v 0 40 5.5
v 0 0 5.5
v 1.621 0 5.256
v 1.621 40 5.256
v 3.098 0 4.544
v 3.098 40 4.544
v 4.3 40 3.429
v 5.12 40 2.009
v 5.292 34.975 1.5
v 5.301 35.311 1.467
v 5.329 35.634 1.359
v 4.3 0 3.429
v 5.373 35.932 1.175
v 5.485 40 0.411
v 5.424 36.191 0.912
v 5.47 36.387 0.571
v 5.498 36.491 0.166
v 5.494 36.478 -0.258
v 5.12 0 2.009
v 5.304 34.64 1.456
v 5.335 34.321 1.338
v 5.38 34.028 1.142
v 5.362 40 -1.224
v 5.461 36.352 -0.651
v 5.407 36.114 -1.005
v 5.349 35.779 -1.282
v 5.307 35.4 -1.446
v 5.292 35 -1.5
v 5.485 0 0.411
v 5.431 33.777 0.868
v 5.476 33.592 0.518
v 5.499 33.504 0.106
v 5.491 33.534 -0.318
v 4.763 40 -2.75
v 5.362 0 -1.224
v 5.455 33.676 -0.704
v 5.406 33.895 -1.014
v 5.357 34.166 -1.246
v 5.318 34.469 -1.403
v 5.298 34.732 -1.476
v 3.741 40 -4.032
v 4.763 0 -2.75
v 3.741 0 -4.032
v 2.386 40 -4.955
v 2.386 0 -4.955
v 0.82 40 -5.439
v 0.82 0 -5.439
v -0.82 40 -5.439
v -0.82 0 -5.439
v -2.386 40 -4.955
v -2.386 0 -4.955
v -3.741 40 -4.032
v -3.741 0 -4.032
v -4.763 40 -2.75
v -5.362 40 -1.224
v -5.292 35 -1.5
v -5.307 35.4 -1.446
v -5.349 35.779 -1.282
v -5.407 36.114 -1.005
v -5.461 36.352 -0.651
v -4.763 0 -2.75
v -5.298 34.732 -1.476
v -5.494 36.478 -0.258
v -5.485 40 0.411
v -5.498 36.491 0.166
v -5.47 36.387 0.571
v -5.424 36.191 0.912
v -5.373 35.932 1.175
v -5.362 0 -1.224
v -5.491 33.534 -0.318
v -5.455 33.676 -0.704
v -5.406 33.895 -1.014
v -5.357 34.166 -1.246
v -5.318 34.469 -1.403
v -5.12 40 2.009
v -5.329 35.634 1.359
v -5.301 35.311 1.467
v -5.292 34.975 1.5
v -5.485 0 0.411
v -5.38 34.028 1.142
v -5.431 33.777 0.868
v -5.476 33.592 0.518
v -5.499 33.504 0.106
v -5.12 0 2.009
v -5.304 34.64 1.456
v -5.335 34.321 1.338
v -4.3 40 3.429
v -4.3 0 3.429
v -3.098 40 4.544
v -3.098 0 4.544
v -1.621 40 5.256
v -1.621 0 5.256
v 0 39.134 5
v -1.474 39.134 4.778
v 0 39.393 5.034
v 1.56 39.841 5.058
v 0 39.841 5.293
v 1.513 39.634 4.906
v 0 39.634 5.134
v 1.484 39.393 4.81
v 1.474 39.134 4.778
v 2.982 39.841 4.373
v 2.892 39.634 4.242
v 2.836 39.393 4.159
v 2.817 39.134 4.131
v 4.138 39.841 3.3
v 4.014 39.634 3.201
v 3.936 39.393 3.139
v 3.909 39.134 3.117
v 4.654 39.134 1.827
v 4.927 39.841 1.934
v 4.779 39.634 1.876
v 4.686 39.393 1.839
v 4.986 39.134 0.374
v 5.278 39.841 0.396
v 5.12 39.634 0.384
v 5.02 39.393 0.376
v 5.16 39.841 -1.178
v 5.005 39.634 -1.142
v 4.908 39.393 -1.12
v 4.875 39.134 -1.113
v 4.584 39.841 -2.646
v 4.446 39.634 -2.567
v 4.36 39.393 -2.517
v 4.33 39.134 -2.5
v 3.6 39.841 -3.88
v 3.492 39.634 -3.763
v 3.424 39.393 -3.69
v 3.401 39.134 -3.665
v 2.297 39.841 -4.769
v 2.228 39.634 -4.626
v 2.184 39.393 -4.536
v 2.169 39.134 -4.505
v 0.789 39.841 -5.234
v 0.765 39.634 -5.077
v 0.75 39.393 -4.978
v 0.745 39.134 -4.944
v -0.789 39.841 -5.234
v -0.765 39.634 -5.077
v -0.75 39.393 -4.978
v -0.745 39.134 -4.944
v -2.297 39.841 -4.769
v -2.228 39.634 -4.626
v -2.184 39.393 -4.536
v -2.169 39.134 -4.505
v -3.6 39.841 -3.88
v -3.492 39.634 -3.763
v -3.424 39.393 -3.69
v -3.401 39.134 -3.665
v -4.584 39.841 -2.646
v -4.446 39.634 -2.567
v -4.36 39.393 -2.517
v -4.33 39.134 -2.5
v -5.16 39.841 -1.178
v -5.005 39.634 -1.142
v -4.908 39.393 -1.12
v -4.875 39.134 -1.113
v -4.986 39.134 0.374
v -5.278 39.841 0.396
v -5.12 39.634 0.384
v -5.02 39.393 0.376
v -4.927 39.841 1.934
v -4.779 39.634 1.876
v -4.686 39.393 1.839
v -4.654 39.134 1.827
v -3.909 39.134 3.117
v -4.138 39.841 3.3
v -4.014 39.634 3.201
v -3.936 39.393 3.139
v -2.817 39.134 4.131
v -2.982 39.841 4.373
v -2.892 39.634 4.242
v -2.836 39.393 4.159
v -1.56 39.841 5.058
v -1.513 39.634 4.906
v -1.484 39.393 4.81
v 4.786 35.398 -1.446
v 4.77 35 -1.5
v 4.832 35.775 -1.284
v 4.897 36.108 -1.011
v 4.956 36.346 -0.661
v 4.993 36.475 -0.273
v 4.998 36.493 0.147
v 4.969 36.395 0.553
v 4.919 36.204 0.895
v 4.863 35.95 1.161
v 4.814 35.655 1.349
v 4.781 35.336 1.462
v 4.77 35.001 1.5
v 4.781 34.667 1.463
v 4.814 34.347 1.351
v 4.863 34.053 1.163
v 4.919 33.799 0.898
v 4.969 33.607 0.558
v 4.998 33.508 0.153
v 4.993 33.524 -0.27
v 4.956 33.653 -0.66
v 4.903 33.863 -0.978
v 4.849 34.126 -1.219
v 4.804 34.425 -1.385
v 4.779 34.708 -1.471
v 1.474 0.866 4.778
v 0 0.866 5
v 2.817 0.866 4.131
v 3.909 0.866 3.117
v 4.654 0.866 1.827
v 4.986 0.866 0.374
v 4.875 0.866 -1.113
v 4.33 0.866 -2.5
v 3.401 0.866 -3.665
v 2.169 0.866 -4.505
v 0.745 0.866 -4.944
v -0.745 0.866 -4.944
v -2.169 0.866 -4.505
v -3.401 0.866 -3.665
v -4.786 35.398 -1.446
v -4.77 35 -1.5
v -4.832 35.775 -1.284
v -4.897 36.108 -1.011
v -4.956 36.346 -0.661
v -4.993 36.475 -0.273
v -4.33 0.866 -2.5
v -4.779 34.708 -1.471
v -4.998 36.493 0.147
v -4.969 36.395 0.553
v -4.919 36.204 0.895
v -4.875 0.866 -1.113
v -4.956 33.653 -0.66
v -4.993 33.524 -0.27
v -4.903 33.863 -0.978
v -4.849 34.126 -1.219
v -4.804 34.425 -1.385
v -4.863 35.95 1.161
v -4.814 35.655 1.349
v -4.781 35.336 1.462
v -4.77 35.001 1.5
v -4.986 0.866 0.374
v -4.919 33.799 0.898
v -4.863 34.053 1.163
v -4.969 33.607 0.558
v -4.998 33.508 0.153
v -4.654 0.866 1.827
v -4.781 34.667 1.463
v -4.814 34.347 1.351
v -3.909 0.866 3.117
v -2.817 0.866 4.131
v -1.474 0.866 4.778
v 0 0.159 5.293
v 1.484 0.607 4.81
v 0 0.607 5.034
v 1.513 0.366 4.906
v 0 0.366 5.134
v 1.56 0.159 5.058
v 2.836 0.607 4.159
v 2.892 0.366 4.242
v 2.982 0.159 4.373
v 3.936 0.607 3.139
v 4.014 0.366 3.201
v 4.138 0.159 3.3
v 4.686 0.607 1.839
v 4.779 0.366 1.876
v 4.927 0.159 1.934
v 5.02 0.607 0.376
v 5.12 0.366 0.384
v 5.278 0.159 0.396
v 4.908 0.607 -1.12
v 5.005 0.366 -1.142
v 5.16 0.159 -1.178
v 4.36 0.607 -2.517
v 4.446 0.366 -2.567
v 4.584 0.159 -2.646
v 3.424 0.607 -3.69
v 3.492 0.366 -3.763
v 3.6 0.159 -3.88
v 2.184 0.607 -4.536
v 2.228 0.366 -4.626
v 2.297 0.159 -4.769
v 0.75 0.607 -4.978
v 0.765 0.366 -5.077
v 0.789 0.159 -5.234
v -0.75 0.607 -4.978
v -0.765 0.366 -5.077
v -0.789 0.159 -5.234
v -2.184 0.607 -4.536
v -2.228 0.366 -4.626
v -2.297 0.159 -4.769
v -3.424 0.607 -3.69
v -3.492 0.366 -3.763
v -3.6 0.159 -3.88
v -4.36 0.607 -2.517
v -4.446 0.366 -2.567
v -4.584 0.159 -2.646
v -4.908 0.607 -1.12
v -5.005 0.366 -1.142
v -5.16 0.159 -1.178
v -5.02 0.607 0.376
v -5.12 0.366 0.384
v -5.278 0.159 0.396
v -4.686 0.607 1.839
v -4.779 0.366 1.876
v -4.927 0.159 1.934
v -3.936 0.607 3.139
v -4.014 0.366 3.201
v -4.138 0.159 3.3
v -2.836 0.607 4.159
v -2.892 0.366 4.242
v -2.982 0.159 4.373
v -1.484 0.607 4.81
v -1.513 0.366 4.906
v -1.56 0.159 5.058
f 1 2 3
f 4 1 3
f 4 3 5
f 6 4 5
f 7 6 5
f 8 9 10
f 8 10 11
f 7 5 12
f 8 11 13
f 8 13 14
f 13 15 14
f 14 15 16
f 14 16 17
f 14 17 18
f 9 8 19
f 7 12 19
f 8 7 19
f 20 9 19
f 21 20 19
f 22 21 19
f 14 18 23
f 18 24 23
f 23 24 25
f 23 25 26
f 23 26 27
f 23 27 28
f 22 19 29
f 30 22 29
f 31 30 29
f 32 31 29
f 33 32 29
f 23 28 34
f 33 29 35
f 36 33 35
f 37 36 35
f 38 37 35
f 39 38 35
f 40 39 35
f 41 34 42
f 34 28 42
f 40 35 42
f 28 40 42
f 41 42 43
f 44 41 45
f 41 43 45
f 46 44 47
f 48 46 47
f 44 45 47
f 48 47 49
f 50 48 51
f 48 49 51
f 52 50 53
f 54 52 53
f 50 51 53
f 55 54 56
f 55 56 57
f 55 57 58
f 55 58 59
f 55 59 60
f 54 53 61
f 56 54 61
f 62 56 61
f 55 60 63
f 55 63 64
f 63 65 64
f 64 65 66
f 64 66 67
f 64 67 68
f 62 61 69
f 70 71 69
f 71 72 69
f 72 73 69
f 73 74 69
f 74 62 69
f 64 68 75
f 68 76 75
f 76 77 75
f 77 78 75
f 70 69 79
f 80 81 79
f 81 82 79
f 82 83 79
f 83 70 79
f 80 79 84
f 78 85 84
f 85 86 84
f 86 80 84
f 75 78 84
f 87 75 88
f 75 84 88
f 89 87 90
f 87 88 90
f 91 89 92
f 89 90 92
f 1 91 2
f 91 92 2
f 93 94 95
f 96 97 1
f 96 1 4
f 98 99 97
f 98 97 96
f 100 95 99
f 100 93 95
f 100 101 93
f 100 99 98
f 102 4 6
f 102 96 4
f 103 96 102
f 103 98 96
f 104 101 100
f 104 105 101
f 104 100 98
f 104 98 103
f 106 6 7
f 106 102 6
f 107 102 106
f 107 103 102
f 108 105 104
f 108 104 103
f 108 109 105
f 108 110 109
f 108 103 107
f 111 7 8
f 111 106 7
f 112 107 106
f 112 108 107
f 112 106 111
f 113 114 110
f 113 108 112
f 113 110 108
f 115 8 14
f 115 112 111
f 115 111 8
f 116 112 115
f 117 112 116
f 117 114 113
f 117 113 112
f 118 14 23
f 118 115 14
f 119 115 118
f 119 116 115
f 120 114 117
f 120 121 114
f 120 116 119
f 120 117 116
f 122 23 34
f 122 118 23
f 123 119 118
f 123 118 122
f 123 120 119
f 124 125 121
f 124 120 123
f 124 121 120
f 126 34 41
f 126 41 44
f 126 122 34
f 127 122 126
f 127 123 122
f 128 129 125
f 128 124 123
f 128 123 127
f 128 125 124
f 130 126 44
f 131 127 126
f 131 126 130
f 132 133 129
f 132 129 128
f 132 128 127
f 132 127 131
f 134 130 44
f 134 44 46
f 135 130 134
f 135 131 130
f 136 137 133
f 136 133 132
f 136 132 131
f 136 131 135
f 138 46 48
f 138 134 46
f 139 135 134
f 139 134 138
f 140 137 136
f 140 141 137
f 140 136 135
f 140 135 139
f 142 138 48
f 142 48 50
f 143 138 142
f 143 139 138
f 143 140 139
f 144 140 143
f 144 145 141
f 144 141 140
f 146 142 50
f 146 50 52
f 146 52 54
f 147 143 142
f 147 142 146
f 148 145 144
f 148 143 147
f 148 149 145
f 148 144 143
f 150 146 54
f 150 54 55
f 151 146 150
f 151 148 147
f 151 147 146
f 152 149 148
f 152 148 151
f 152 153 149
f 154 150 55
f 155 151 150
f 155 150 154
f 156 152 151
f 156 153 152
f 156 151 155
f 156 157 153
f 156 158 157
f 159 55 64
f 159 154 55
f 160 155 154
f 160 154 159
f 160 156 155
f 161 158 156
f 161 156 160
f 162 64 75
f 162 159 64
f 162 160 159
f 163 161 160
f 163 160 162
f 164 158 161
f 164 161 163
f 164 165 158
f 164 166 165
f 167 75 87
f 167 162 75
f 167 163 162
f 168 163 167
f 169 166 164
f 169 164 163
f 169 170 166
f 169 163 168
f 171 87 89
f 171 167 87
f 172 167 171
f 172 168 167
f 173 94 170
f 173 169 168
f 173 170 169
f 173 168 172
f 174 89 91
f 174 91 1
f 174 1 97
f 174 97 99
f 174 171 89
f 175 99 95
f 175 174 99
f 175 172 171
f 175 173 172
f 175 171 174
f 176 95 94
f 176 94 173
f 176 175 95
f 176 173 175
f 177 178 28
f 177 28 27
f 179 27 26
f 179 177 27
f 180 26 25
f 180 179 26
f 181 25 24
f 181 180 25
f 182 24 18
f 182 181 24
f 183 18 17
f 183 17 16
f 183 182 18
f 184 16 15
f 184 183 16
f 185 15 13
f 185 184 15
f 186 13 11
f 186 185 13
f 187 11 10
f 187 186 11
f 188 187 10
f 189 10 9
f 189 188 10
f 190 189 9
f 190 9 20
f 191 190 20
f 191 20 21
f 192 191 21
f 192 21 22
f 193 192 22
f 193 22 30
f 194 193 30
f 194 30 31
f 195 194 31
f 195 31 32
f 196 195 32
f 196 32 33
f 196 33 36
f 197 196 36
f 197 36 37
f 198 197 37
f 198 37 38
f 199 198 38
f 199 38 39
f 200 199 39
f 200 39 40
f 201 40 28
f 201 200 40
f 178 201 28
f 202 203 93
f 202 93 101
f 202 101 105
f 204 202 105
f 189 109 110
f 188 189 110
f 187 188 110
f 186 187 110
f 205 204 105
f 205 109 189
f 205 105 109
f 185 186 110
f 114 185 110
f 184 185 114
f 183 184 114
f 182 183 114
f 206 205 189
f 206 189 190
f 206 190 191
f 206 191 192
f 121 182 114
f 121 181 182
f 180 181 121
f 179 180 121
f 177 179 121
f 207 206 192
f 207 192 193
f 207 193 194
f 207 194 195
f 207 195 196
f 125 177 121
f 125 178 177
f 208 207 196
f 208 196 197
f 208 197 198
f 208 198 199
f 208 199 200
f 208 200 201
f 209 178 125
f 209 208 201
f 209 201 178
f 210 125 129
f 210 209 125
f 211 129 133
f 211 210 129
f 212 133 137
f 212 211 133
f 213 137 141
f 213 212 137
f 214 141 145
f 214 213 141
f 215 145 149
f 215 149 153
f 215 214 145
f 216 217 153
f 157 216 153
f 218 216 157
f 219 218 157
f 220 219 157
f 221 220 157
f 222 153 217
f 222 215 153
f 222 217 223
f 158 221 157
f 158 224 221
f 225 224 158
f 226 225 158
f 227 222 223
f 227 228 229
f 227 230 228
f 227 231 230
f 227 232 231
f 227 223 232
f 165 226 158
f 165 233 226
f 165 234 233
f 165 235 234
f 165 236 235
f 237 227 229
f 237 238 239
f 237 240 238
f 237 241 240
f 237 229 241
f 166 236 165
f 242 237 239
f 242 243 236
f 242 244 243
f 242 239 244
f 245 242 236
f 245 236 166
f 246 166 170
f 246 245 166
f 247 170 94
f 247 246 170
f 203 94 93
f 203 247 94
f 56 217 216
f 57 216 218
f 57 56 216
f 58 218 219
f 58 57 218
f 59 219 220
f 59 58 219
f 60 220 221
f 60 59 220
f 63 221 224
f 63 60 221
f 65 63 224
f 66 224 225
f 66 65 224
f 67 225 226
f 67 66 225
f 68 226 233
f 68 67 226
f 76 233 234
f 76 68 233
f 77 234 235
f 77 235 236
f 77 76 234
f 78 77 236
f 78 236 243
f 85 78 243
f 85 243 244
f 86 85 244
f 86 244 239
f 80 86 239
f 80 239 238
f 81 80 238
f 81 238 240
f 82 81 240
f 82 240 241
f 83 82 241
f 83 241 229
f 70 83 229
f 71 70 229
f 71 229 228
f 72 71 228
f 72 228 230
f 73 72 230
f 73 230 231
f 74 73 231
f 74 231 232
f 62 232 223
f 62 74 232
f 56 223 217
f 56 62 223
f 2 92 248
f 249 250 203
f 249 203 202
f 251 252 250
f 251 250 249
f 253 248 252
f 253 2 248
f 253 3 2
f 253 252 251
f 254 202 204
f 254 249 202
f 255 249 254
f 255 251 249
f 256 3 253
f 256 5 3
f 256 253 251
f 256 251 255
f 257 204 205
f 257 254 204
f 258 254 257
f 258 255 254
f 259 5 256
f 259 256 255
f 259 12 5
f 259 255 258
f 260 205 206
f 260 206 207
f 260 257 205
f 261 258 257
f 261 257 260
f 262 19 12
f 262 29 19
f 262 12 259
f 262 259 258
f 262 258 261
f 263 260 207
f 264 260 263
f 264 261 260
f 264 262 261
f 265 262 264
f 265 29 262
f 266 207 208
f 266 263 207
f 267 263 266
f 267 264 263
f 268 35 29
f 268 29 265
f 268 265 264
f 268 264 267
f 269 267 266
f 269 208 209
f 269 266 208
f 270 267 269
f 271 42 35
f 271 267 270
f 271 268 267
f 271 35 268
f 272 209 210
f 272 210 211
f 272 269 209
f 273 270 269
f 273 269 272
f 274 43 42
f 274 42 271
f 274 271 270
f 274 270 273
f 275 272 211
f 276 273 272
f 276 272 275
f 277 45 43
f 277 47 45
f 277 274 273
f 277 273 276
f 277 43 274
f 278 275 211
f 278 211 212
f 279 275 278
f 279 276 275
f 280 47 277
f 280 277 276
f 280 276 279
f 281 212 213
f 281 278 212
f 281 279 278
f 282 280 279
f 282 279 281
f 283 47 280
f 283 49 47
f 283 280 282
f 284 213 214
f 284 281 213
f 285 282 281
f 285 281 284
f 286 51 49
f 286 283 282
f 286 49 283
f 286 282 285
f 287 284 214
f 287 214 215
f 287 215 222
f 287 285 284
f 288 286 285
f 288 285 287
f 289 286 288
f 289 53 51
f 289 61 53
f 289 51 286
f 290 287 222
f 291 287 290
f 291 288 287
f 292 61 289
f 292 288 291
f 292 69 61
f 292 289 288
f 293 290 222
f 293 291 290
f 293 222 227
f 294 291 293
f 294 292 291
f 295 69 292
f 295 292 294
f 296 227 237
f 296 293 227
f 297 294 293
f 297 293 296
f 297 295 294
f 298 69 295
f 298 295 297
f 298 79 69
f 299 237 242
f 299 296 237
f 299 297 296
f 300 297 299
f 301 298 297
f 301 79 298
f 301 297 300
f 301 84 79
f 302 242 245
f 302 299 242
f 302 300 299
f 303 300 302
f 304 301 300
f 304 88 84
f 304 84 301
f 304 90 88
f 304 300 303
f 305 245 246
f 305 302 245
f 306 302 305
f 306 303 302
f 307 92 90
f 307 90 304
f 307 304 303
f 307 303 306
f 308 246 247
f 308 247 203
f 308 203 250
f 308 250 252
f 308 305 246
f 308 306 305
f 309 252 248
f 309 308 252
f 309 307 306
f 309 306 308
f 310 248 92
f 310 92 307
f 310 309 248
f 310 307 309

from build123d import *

# Parameters (mm, degrees)
SKETCH1_R               = 5.5
SKETCH1_R_2             = 4.999999999999999
BOSS_EXTRUDE1_DEPTH     = 40
FILLET1_R               = 1
FILLET2_R               = 1
CUT_EXTRUDE1_DEPTH      = 41.74923312161882
CUT_EXTRUDE1_DEPTH_BACK = 41.74923312161882
SKETCH2_R               = 1.5000000000000004


with BuildPart() as part:
    # Sketch1 → Boss-Extrude1 (new body)
    with BuildSketch(Plane(origin=(0, 0, 0), x_dir=(1, 0, 0), z_dir=(0, 1, 0))):
        with Locations(Location((0, 0, 0), (0, 0, 270))):
            Circle(SKETCH1_R)
        with Locations(Location((0, 0, 0), (0, 0, 270))):
            Circle(SKETCH1_R_2, mode=Mode.SUBTRACT)
    extrude(amount=BOSS_EXTRUDE1_DEPTH)

    # Fillet1
    # the kernel refuses this fillet: 1 mm, written as the material it takes off along each edge
    with BuildSketch(Plane(origin=(0, 40, 0), x_dir=(-1.8e-16, 0, 1), z_dir=(-1, 0, -1.8e-16))) as fillet1_piece_1:
        with BuildLine():
            CenterArc((5.999999999999999, -0.8660254037844908), FILLET1_R, 119.9999999999984, 60.00000000000159)
            Line((5.500000000000022, -3.553e-14), (5.490000000000022, 0.01732050807565599))
            ThreePointArc((5.490000000000022, 0.01732050807565599), (5.250000000000011, 0.02000000000000313), (4.999999999999999, 0.02000000000000313))
            Line((4.999999999999999, 0.02000000000000313), (4.9799999999999995, 0))
            Line((4.9799999999999995, 0), (4.9799999999999995, -0.8660254037844908))
            Line((4.9799999999999995, -0.8660254037844908), (4.999999999999999, -0.8660254037844908))
        make_face()
    revolve(axis=Axis((0, 40, 0), (0, 1, 0)), mode=Mode.SUBTRACT)

    # Fillet2
    # the kernel refuses this fillet: 1 mm, written as the material it takes off along each edge
    with BuildSketch(Plane(origin=(0, 0, 0), x_dir=(-1.8e-16, 0, 1), z_dir=(-1, 0, -1.8e-16))) as fillet2_piece_1:
        with BuildLine():
            CenterArc((5.999999999999999, 0.866025403784488), FILLET2_R, 180, 60.00000000000148)
            Line((4.999999999999999, 0.866025403784488), (4.9799999999999995, 0.866025403784488))
            Line((4.9799999999999995, 0.866025403784488), (4.9799999999999995, 0))
            Line((4.9799999999999995, 0), (4.999999999999999, -0.02))
            ThreePointArc((4.999999999999999, -0.02), (5.250000000000011, -0.02), (5.4900000000000215, -0.0173205080756525))
            Line((5.4900000000000215, -0.0173205080756525), (5.500000000000021, 3.653e-14))
        make_face()
    revolve(axis=Axis((0, 0, 0), (0, 1, 0)), mode=Mode.SUBTRACT)

    # Sketch2 → Cut-Extrude1 (cut, two sides: drawn at the far end of the back side and taken through both)
    with BuildSketch(Plane(origin=(0, 0, 0), x_dir=(0, 0, -1), z_dir=(1, 0, 0)).offset(-CUT_EXTRUDE1_DEPTH_BACK)):
        with Locations((0, 35)):
            Circle(SKETCH2_R)
    extrude(amount=CUT_EXTRUDE1_DEPTH + CUT_EXTRUDE1_DEPTH_BACK, mode=Mode.SUBTRACT)


solid = part.part
